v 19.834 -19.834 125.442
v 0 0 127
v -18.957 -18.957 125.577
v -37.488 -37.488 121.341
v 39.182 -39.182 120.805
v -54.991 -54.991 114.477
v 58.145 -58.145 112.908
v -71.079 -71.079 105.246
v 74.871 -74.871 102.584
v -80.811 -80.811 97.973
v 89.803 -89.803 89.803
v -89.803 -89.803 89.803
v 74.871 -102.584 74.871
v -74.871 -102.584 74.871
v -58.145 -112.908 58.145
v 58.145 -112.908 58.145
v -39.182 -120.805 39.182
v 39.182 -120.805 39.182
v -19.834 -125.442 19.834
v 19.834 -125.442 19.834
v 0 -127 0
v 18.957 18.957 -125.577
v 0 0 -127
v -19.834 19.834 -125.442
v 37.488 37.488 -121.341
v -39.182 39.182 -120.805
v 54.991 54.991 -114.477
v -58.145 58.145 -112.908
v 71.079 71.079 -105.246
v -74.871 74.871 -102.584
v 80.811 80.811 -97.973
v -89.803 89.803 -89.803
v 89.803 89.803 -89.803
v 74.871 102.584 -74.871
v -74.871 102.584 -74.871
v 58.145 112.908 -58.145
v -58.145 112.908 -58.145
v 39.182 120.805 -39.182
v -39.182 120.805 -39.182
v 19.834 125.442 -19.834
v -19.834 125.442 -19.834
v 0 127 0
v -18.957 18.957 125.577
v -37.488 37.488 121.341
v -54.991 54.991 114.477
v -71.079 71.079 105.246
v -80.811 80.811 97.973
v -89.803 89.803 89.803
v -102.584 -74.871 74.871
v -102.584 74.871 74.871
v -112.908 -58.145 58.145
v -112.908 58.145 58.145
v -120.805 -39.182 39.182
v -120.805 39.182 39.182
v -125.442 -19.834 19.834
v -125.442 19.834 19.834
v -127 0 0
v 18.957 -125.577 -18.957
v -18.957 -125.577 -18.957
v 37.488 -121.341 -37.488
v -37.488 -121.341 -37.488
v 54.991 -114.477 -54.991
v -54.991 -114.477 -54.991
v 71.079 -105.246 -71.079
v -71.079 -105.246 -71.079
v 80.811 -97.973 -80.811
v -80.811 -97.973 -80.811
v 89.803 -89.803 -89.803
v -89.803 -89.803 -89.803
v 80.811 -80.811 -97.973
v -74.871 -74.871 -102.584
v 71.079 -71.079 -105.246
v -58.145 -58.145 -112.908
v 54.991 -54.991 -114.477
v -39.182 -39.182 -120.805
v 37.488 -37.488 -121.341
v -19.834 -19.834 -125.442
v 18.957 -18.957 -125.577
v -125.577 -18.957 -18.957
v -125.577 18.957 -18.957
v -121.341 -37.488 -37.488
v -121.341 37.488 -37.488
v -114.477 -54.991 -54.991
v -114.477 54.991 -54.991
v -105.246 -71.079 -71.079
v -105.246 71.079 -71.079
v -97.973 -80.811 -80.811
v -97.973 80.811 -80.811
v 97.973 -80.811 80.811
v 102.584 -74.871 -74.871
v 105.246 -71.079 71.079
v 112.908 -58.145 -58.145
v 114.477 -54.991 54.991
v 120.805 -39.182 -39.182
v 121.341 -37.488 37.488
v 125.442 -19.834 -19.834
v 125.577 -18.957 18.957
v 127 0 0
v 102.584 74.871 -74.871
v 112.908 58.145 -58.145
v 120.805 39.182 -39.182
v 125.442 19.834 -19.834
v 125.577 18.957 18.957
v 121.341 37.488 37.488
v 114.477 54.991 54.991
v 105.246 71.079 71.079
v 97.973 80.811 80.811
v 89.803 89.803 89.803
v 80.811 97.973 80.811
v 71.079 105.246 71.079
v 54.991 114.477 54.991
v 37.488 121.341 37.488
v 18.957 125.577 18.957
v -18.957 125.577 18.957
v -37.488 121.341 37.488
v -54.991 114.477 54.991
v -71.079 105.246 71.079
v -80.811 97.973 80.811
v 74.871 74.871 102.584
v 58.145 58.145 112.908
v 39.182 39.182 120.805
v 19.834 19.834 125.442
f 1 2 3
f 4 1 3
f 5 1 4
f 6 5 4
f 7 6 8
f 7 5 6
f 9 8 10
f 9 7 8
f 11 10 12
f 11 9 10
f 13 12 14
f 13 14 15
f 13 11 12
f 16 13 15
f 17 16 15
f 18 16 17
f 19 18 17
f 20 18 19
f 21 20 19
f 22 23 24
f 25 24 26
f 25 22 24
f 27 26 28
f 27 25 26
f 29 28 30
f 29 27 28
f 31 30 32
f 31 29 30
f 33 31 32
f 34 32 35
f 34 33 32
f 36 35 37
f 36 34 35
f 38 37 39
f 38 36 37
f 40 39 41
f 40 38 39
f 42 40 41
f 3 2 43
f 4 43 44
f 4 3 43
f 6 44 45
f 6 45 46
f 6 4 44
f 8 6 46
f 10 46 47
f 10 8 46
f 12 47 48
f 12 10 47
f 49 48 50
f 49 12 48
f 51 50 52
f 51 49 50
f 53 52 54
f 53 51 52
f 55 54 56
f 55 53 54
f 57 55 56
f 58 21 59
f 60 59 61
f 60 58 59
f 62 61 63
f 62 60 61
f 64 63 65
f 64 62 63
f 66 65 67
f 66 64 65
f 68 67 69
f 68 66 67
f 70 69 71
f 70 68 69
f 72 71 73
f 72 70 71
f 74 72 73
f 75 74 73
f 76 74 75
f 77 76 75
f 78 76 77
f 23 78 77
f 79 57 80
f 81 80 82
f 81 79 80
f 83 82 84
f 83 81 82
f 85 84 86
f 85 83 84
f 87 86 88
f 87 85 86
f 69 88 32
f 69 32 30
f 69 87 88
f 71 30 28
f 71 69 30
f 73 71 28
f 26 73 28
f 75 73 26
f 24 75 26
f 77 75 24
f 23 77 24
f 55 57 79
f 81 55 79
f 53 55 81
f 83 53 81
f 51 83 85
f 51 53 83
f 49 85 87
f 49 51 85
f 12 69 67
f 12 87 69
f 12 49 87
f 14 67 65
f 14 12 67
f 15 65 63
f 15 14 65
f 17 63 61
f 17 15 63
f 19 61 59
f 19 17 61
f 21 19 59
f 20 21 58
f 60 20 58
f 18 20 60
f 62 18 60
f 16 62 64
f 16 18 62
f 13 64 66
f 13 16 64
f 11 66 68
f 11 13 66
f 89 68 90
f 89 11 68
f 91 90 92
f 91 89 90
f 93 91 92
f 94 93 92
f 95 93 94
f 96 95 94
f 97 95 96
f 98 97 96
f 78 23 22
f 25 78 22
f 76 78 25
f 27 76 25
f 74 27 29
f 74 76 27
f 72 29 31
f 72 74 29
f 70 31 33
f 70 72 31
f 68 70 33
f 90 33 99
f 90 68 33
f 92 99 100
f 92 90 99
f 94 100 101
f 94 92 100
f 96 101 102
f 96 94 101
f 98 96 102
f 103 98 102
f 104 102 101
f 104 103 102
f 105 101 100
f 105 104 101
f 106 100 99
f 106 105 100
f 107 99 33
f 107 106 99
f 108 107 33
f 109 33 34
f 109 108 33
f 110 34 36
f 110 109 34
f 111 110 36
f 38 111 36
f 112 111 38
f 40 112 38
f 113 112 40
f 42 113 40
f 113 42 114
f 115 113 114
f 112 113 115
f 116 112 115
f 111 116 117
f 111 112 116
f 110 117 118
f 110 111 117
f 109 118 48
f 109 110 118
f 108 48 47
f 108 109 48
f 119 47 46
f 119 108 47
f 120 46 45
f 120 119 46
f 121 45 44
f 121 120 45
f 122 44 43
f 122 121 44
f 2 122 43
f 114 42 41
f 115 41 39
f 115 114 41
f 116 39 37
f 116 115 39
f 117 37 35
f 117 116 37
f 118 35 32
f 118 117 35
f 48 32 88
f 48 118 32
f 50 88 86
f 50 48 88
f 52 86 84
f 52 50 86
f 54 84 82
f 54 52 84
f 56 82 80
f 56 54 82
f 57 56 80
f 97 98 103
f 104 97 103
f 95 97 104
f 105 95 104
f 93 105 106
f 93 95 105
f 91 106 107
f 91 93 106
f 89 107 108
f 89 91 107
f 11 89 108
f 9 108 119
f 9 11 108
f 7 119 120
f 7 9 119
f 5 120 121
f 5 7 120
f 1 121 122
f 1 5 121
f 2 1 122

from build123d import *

# Parameters (mm, degrees)
F0_R     = 127
F1_DEPTH = 127
F2_R     = 127
F3_DEPTH = 127
F4_R     = 127
F5_DEPTH = 127


with BuildPart() as f1:
    # F0 (on Front) → F1 (new body, symmetric)
    with BuildSketch(Plane.XZ):
        Circle(F0_R)
    extrude(amount=F1_DEPTH, both=True)

    # F2 (on Right) → F3 (intersect, symmetric)
    with BuildSketch(Plane.YZ):
        Circle(F2_R)
    extrude(amount=F3_DEPTH, both=True, mode=Mode.INTERSECT)

    # F4 (on Top) → F5 (intersect, symmetric)
    with BuildSketch(Plane.XY):
        Circle(F4_R)
    extrude(amount=F5_DEPTH, both=True, mode=Mode.INTERSECT)


solid = f1.part
